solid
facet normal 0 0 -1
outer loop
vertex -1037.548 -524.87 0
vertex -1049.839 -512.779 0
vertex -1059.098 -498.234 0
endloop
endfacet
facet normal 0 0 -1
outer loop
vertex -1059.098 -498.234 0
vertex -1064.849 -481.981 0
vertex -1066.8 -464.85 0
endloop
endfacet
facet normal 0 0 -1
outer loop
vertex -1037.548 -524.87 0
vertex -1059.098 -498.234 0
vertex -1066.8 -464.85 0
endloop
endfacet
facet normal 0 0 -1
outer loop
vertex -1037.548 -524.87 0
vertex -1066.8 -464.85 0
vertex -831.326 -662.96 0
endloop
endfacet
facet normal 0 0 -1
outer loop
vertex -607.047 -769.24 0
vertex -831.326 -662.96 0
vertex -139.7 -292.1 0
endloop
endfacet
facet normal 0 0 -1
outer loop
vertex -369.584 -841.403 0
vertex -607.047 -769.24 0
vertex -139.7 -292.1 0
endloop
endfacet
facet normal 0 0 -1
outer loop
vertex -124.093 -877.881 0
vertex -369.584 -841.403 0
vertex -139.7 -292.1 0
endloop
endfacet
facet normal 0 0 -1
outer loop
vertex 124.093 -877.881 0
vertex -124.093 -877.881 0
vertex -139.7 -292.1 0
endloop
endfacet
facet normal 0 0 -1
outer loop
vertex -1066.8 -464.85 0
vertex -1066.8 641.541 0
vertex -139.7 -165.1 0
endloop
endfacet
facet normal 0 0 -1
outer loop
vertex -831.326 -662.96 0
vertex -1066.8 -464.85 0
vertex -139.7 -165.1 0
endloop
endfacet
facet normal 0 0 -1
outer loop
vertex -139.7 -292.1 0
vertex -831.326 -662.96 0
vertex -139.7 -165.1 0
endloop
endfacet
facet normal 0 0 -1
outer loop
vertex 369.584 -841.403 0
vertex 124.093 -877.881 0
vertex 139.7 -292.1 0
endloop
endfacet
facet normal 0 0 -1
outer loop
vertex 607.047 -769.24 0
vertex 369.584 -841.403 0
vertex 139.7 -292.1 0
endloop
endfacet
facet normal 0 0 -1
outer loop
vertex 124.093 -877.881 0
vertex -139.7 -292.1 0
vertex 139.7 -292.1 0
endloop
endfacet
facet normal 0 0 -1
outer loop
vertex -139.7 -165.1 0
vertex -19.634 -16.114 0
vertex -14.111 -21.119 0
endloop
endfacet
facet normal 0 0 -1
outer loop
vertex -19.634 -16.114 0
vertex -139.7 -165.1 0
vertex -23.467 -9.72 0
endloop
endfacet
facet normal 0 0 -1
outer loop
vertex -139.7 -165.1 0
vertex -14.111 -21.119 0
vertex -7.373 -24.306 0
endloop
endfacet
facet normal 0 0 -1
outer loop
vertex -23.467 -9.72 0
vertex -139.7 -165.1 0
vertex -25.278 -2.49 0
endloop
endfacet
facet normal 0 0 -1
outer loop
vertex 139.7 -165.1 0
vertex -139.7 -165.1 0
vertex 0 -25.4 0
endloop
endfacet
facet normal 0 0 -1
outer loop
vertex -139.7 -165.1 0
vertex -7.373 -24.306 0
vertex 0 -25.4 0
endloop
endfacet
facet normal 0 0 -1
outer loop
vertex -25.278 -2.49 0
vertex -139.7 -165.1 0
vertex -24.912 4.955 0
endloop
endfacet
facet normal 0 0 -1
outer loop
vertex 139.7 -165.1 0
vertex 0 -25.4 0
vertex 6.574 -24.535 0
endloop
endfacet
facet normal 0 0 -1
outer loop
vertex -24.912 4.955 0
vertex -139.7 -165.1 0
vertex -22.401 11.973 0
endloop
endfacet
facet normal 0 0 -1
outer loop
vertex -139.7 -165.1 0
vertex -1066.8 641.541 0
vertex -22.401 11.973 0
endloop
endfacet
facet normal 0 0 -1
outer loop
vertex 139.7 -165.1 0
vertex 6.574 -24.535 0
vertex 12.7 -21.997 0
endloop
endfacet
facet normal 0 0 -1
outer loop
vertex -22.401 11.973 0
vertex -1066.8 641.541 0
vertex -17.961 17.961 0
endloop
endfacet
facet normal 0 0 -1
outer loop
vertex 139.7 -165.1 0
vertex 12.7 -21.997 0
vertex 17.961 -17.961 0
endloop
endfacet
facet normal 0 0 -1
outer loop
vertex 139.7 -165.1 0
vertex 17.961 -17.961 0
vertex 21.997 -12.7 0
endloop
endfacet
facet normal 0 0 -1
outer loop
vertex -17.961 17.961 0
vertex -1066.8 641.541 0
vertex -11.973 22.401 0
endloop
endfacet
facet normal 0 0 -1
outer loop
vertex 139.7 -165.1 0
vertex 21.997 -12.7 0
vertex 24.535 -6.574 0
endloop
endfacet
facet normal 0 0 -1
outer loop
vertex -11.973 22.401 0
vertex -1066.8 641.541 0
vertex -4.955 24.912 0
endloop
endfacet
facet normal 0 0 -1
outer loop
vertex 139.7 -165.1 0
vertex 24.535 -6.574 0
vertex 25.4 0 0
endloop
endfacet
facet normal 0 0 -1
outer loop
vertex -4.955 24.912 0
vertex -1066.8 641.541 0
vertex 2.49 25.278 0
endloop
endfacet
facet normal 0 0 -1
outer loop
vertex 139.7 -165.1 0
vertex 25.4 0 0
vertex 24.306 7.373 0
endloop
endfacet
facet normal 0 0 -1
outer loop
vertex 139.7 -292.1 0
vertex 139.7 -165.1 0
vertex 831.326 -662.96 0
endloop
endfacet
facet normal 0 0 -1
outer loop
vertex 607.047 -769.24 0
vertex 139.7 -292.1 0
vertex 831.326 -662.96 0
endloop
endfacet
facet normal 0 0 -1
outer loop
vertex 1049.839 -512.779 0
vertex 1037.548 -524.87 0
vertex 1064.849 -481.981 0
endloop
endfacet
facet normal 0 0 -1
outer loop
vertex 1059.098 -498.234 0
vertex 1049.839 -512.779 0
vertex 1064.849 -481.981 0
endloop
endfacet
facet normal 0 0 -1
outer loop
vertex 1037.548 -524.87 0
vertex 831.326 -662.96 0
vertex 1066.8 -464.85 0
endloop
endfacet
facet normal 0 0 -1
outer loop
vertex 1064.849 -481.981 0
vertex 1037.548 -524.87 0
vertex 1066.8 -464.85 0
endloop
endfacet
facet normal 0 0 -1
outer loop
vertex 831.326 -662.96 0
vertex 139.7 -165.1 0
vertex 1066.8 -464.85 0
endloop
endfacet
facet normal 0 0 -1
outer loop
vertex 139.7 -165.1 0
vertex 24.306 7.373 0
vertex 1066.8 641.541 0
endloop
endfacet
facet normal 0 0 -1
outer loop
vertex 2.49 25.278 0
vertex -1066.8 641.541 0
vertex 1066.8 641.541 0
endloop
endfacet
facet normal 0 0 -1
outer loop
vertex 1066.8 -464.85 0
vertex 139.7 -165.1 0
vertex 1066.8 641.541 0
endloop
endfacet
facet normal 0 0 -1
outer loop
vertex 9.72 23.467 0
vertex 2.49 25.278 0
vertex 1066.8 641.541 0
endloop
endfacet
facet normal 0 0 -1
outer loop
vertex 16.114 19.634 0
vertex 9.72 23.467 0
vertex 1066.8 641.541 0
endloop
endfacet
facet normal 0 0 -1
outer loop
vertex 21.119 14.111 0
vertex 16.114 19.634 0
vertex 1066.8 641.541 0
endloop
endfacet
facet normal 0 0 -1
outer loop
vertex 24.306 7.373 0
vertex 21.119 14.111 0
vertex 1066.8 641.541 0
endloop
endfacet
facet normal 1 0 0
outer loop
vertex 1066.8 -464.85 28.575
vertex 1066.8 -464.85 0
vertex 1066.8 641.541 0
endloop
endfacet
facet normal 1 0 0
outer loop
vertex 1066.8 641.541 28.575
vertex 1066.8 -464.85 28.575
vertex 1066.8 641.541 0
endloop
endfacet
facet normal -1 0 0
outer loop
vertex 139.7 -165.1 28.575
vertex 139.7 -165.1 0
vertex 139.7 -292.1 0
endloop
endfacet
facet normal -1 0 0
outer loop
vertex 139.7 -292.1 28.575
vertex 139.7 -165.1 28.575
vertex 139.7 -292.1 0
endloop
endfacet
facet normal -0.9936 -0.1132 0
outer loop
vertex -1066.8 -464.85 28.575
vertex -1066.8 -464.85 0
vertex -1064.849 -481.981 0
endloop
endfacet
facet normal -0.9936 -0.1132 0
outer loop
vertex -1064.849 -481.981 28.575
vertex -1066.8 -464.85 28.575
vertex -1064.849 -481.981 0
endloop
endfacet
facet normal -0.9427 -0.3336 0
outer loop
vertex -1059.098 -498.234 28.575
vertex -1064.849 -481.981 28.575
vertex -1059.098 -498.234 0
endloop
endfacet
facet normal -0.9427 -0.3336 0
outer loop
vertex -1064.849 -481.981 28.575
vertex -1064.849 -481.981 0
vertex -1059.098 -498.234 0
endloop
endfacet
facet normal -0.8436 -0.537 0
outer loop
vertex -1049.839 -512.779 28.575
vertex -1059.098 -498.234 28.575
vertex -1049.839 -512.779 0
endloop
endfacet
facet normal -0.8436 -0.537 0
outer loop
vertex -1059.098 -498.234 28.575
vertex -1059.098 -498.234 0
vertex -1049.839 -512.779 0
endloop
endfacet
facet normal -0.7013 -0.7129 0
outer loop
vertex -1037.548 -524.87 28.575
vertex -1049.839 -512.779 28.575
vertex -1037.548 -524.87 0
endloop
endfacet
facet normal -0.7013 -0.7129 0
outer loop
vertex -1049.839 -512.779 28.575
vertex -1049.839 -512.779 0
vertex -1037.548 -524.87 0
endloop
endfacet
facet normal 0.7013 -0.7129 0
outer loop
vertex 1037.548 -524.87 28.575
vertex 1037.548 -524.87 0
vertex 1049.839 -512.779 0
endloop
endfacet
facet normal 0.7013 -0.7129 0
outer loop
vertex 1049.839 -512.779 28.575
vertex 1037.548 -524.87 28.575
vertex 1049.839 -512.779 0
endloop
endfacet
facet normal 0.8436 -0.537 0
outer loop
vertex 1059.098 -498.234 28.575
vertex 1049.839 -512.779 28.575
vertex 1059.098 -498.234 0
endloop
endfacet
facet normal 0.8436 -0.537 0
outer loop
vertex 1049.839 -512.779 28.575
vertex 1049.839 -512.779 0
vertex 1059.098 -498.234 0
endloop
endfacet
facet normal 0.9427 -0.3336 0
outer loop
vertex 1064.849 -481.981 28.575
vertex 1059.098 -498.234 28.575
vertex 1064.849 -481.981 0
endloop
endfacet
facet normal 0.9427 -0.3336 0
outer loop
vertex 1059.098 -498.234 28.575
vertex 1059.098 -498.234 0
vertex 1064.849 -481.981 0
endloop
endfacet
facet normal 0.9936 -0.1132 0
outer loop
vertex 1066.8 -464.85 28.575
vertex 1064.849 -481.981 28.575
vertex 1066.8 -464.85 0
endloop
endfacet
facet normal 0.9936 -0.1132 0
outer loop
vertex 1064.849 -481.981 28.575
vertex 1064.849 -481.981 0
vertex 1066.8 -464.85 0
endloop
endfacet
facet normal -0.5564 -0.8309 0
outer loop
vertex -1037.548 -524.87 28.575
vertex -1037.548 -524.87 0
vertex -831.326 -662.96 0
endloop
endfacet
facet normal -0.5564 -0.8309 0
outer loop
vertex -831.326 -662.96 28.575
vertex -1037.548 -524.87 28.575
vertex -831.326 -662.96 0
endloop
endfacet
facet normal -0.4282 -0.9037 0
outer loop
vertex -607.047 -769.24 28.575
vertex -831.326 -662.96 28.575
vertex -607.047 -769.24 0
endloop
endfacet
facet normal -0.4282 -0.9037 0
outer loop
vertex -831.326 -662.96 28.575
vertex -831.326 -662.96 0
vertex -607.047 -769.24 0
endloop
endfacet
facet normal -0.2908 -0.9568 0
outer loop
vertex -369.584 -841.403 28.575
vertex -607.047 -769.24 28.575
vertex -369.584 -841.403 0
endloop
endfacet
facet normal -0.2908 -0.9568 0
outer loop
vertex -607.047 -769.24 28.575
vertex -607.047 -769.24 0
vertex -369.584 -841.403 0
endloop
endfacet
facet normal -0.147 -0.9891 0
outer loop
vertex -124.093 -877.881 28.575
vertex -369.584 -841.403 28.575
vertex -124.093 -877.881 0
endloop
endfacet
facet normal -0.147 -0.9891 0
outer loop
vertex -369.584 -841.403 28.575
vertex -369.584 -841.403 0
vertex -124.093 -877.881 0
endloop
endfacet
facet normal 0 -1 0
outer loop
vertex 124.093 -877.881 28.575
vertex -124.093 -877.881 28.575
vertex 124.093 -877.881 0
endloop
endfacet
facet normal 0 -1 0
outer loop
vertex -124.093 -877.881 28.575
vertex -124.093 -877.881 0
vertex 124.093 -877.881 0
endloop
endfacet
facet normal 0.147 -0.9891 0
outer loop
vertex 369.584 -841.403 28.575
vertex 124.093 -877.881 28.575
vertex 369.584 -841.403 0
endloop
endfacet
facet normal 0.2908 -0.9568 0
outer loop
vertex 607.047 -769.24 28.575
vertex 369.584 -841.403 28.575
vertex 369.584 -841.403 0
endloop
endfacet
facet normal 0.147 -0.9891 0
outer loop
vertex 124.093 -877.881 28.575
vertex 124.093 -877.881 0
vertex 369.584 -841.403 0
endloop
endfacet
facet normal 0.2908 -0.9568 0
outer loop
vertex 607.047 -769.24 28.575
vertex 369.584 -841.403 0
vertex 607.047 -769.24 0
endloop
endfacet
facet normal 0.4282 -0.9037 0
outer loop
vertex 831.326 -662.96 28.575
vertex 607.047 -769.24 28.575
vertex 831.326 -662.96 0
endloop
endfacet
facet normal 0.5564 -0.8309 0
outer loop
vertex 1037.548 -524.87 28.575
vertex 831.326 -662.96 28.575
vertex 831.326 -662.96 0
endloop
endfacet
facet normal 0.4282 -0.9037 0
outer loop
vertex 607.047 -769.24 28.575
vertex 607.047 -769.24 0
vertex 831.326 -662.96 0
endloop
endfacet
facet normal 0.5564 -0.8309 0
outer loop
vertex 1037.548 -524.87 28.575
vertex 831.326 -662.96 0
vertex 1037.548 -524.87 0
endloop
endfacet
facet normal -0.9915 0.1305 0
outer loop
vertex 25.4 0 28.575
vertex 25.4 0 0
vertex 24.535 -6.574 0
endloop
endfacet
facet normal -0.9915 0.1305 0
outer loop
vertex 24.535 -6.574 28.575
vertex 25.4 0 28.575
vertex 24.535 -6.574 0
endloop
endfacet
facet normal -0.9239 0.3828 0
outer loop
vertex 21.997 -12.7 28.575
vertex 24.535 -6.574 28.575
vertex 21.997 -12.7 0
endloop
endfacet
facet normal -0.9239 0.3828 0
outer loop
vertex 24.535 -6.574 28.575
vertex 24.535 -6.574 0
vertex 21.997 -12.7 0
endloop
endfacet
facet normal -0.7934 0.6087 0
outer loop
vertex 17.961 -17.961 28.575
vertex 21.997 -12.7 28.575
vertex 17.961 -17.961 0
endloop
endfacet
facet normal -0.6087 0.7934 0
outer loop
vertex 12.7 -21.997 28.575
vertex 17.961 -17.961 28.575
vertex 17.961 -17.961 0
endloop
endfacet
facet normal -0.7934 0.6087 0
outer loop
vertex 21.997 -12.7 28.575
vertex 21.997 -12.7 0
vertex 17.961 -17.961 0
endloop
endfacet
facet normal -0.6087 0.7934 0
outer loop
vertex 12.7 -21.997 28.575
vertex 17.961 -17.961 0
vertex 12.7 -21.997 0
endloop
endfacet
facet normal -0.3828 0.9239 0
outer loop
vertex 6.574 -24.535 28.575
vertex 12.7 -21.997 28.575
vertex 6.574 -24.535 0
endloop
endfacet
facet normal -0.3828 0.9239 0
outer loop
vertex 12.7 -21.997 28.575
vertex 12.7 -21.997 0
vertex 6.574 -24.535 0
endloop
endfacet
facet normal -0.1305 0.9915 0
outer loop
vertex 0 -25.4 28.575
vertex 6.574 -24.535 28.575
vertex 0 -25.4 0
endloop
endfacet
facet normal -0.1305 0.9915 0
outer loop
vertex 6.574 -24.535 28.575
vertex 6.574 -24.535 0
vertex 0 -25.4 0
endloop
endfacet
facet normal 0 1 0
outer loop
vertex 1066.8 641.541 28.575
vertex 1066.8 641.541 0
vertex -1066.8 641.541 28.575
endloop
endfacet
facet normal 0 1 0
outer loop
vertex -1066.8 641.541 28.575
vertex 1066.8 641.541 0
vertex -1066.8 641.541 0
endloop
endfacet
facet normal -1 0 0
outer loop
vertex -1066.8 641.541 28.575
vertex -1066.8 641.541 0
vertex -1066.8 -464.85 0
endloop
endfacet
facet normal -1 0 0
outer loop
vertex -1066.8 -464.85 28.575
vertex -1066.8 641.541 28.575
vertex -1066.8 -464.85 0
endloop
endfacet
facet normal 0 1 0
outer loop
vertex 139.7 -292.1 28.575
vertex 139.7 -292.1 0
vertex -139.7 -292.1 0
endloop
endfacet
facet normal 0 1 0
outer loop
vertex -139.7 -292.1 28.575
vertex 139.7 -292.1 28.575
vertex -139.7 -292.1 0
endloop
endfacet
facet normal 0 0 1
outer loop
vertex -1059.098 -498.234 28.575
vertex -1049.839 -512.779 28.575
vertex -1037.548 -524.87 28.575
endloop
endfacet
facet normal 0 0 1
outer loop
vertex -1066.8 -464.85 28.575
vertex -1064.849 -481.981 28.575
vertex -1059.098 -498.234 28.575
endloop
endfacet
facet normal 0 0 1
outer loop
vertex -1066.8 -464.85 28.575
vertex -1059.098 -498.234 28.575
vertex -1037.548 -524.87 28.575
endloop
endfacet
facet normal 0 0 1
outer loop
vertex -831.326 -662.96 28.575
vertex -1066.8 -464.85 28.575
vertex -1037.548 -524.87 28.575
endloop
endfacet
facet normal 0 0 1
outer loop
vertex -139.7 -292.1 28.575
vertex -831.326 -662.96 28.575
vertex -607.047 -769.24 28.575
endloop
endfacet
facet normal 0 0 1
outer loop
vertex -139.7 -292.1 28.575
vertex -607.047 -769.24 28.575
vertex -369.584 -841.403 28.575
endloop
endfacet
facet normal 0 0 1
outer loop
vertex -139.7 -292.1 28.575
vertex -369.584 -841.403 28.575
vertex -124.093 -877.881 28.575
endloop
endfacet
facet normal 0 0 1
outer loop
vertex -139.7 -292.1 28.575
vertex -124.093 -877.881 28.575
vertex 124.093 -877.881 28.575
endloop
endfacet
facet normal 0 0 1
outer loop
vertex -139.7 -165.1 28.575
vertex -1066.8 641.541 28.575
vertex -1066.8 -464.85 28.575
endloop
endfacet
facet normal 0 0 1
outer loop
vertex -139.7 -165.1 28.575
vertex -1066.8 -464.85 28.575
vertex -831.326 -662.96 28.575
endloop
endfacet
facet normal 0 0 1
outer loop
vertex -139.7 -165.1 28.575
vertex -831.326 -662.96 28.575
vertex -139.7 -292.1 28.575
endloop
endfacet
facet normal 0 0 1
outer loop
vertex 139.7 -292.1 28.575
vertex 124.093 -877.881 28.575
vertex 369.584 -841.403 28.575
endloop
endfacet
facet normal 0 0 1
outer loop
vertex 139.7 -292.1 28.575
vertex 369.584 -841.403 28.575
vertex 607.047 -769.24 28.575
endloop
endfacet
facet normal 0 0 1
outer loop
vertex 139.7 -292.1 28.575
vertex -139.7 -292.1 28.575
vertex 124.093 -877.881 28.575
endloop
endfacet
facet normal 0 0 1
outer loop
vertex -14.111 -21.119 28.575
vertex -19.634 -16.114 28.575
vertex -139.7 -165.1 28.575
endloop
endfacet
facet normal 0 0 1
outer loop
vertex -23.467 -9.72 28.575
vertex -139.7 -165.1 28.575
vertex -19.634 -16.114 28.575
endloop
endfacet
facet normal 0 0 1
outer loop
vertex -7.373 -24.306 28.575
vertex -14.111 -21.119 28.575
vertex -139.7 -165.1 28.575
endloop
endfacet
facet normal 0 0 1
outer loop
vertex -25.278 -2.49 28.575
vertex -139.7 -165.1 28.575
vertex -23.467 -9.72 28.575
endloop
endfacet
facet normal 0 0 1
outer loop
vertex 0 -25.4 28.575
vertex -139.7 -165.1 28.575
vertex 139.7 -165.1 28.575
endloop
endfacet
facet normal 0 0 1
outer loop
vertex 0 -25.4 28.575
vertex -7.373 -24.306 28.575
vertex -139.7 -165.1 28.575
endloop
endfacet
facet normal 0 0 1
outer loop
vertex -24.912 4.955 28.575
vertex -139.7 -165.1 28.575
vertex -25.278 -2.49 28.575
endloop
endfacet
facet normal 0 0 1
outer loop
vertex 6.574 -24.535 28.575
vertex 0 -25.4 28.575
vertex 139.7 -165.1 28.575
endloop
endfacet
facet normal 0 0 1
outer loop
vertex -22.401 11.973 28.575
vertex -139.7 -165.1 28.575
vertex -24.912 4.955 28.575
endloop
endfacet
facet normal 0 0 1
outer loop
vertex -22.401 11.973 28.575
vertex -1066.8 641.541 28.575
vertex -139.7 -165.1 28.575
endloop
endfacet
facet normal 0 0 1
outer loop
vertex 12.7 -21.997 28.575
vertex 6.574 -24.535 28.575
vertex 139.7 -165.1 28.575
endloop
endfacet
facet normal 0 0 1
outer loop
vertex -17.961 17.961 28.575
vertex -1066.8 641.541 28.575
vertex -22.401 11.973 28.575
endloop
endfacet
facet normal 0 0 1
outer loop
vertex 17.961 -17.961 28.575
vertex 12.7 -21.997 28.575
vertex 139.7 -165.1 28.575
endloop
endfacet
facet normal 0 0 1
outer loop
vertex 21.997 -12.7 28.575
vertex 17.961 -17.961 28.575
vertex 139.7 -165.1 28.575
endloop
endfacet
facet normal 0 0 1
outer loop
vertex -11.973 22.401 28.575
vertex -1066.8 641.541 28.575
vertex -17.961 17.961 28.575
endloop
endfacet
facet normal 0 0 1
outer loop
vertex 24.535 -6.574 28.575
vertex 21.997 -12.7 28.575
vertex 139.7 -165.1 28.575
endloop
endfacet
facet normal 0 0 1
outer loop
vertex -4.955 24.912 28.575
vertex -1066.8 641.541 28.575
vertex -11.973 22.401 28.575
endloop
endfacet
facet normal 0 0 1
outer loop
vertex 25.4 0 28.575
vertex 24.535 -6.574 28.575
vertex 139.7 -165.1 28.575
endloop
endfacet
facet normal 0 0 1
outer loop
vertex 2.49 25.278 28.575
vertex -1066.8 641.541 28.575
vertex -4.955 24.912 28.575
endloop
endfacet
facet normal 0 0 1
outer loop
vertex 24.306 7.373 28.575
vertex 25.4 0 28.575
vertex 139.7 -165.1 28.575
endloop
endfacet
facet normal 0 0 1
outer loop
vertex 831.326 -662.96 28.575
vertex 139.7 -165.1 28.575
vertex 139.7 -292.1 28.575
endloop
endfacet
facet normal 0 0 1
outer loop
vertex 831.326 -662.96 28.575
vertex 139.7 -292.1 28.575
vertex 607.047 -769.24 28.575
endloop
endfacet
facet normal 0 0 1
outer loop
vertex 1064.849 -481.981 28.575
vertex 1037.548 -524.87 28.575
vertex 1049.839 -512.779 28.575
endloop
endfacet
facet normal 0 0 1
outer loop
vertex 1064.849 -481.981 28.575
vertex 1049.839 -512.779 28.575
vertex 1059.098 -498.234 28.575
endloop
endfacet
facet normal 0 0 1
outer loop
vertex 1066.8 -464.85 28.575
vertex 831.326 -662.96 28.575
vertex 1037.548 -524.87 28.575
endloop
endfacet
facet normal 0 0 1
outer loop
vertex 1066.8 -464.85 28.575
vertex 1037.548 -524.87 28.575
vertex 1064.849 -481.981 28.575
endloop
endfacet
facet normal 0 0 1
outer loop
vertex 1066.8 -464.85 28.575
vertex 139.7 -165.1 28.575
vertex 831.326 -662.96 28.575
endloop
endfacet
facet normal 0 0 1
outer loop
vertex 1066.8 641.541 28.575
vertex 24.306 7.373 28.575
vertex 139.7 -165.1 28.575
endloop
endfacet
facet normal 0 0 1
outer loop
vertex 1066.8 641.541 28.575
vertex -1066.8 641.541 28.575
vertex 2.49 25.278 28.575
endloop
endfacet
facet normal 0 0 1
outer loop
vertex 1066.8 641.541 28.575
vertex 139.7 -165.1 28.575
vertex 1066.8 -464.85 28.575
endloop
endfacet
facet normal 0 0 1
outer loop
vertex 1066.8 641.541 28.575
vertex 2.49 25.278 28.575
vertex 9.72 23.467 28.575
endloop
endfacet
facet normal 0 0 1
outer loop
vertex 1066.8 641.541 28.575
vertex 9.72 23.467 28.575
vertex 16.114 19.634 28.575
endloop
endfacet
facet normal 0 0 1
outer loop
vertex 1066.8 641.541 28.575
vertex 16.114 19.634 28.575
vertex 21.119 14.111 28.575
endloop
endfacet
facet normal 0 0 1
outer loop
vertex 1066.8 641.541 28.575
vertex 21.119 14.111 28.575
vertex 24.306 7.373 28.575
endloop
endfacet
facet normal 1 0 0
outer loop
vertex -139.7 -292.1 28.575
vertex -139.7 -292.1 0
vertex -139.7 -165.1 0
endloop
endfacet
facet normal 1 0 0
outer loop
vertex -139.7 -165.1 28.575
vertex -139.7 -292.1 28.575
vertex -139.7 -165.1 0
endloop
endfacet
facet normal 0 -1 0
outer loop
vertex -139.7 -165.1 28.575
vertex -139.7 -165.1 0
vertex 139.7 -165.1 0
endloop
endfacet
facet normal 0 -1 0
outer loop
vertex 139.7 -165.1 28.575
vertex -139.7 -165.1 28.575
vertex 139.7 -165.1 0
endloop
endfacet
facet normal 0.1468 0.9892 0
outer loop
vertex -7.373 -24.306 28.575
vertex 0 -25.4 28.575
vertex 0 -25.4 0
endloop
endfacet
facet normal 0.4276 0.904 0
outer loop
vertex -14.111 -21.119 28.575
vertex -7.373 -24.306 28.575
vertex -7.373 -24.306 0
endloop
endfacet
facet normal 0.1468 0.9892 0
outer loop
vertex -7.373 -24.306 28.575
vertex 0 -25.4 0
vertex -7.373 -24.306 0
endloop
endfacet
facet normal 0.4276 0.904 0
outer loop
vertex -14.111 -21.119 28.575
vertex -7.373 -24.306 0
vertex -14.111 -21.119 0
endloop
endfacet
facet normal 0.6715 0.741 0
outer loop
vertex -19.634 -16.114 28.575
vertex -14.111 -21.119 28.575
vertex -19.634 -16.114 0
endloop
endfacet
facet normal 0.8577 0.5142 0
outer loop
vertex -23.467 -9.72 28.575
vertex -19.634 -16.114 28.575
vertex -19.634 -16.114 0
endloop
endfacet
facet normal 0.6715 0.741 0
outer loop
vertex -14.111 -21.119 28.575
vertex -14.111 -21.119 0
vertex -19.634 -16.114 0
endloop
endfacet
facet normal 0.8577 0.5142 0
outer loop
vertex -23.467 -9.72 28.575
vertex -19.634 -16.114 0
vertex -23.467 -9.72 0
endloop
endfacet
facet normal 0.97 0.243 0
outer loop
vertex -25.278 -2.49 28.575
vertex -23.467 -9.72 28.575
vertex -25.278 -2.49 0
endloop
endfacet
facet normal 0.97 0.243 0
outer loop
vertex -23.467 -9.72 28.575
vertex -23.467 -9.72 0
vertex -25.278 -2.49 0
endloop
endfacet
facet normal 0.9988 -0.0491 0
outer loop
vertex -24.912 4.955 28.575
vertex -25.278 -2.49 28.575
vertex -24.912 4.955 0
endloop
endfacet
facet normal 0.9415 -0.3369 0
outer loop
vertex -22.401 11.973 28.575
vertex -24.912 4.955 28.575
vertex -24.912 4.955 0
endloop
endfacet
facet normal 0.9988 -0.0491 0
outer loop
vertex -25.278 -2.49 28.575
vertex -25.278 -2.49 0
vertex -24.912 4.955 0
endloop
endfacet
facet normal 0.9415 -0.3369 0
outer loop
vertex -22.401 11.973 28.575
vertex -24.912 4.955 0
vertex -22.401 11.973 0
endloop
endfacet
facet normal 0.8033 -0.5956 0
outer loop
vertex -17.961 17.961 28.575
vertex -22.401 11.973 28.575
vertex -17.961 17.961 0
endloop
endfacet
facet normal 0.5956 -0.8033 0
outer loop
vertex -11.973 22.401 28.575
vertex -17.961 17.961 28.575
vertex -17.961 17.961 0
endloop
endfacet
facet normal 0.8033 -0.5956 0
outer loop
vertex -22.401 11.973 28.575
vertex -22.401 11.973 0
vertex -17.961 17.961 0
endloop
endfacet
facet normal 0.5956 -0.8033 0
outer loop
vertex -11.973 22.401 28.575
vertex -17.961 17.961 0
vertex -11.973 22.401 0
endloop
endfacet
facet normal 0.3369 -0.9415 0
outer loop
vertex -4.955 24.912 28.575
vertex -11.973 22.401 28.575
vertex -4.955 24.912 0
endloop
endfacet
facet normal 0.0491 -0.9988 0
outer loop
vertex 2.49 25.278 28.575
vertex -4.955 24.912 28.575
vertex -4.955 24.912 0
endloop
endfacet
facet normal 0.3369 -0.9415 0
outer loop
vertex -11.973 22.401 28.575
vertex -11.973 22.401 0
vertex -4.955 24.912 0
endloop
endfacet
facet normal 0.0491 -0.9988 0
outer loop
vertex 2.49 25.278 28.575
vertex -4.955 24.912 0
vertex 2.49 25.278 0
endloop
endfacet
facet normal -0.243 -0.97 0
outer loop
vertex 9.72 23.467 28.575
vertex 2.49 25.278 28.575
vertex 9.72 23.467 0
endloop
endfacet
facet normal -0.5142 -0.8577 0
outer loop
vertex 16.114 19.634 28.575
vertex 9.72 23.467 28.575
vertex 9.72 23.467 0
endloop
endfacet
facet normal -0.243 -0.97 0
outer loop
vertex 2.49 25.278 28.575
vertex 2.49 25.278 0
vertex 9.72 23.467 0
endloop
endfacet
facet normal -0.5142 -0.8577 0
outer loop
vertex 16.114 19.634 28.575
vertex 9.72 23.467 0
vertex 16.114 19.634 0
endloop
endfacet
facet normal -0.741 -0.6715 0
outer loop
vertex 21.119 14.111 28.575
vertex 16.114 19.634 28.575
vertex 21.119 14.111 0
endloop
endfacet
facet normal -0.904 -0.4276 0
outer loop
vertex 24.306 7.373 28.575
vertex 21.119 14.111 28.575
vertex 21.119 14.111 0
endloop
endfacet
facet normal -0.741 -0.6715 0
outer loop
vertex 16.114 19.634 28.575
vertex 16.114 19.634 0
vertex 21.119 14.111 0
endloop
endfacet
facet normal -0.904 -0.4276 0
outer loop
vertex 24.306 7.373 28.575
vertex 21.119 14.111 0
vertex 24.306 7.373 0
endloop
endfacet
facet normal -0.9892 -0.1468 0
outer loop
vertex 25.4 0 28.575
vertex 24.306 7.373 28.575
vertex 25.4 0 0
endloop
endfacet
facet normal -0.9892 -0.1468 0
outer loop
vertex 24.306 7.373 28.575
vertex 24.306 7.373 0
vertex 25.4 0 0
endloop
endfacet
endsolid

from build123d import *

# Parameters (mm, degrees)
F1_DEPTH = 28.575


# Not quite as in the source:
# - a feature names something its author has since deleted; it is built from what else it names


with BuildPart() as f1:
    # F0 (on Top) → F1 (new body)
    with BuildSketch(Plane.XY):
        with BuildLine():
            ThreePointArc((-1037.5478672986, -524.8695620945), (-548.7202955818, -790.5538516378), (0, -882.4590952158))
            ThreePointArc((0, -882.4590952158), (548.7202955818, -790.5538516378), (1037.5478672986, -524.8695620945))
            ThreePointArc((1037.5478672986, -524.8695620945), (1059.0976915237, -498.2343056164), (1066.8, -464.8500839552))
            Line((1066.8, -464.8500839552), (1066.8, -44.2590952158))
            Line((1066.8, -44.2590952158), (1066.8, 641.5409047842))
            Line((1066.8, 641.5409047842), (-1066.8, 641.5409047842))
            Line((-1066.8, 641.5409047842), (-1066.8, -44.2590952158))
            Line((-1066.8, -44.2590952158), (-1066.8, -464.8500839552))
            ThreePointArc((-1066.8, -464.8500839552), (-1059.0976915237, -498.2343056164), (-1037.5478672986, -524.8695620945))
        make_face()
        Polygon((-139.7, -165.1), (0, -165.1), (139.7, -165.1), (139.7, -292.1), (0, -292.1), (-139.7, -292.1), align=None, mode=Mode.SUBTRACT)
        with BuildLine():
            ThreePointArc((0, -25.4), (-17.9605122421, 17.9605122421), (25.4, 0))
            ThreePointArc((25.4, 0), (17.9605122421, -17.9605122421), (0, -25.4))
        make_face(mode=Mode.SUBTRACT)
    extrude(amount=F1_DEPTH)


solid = f1.part
